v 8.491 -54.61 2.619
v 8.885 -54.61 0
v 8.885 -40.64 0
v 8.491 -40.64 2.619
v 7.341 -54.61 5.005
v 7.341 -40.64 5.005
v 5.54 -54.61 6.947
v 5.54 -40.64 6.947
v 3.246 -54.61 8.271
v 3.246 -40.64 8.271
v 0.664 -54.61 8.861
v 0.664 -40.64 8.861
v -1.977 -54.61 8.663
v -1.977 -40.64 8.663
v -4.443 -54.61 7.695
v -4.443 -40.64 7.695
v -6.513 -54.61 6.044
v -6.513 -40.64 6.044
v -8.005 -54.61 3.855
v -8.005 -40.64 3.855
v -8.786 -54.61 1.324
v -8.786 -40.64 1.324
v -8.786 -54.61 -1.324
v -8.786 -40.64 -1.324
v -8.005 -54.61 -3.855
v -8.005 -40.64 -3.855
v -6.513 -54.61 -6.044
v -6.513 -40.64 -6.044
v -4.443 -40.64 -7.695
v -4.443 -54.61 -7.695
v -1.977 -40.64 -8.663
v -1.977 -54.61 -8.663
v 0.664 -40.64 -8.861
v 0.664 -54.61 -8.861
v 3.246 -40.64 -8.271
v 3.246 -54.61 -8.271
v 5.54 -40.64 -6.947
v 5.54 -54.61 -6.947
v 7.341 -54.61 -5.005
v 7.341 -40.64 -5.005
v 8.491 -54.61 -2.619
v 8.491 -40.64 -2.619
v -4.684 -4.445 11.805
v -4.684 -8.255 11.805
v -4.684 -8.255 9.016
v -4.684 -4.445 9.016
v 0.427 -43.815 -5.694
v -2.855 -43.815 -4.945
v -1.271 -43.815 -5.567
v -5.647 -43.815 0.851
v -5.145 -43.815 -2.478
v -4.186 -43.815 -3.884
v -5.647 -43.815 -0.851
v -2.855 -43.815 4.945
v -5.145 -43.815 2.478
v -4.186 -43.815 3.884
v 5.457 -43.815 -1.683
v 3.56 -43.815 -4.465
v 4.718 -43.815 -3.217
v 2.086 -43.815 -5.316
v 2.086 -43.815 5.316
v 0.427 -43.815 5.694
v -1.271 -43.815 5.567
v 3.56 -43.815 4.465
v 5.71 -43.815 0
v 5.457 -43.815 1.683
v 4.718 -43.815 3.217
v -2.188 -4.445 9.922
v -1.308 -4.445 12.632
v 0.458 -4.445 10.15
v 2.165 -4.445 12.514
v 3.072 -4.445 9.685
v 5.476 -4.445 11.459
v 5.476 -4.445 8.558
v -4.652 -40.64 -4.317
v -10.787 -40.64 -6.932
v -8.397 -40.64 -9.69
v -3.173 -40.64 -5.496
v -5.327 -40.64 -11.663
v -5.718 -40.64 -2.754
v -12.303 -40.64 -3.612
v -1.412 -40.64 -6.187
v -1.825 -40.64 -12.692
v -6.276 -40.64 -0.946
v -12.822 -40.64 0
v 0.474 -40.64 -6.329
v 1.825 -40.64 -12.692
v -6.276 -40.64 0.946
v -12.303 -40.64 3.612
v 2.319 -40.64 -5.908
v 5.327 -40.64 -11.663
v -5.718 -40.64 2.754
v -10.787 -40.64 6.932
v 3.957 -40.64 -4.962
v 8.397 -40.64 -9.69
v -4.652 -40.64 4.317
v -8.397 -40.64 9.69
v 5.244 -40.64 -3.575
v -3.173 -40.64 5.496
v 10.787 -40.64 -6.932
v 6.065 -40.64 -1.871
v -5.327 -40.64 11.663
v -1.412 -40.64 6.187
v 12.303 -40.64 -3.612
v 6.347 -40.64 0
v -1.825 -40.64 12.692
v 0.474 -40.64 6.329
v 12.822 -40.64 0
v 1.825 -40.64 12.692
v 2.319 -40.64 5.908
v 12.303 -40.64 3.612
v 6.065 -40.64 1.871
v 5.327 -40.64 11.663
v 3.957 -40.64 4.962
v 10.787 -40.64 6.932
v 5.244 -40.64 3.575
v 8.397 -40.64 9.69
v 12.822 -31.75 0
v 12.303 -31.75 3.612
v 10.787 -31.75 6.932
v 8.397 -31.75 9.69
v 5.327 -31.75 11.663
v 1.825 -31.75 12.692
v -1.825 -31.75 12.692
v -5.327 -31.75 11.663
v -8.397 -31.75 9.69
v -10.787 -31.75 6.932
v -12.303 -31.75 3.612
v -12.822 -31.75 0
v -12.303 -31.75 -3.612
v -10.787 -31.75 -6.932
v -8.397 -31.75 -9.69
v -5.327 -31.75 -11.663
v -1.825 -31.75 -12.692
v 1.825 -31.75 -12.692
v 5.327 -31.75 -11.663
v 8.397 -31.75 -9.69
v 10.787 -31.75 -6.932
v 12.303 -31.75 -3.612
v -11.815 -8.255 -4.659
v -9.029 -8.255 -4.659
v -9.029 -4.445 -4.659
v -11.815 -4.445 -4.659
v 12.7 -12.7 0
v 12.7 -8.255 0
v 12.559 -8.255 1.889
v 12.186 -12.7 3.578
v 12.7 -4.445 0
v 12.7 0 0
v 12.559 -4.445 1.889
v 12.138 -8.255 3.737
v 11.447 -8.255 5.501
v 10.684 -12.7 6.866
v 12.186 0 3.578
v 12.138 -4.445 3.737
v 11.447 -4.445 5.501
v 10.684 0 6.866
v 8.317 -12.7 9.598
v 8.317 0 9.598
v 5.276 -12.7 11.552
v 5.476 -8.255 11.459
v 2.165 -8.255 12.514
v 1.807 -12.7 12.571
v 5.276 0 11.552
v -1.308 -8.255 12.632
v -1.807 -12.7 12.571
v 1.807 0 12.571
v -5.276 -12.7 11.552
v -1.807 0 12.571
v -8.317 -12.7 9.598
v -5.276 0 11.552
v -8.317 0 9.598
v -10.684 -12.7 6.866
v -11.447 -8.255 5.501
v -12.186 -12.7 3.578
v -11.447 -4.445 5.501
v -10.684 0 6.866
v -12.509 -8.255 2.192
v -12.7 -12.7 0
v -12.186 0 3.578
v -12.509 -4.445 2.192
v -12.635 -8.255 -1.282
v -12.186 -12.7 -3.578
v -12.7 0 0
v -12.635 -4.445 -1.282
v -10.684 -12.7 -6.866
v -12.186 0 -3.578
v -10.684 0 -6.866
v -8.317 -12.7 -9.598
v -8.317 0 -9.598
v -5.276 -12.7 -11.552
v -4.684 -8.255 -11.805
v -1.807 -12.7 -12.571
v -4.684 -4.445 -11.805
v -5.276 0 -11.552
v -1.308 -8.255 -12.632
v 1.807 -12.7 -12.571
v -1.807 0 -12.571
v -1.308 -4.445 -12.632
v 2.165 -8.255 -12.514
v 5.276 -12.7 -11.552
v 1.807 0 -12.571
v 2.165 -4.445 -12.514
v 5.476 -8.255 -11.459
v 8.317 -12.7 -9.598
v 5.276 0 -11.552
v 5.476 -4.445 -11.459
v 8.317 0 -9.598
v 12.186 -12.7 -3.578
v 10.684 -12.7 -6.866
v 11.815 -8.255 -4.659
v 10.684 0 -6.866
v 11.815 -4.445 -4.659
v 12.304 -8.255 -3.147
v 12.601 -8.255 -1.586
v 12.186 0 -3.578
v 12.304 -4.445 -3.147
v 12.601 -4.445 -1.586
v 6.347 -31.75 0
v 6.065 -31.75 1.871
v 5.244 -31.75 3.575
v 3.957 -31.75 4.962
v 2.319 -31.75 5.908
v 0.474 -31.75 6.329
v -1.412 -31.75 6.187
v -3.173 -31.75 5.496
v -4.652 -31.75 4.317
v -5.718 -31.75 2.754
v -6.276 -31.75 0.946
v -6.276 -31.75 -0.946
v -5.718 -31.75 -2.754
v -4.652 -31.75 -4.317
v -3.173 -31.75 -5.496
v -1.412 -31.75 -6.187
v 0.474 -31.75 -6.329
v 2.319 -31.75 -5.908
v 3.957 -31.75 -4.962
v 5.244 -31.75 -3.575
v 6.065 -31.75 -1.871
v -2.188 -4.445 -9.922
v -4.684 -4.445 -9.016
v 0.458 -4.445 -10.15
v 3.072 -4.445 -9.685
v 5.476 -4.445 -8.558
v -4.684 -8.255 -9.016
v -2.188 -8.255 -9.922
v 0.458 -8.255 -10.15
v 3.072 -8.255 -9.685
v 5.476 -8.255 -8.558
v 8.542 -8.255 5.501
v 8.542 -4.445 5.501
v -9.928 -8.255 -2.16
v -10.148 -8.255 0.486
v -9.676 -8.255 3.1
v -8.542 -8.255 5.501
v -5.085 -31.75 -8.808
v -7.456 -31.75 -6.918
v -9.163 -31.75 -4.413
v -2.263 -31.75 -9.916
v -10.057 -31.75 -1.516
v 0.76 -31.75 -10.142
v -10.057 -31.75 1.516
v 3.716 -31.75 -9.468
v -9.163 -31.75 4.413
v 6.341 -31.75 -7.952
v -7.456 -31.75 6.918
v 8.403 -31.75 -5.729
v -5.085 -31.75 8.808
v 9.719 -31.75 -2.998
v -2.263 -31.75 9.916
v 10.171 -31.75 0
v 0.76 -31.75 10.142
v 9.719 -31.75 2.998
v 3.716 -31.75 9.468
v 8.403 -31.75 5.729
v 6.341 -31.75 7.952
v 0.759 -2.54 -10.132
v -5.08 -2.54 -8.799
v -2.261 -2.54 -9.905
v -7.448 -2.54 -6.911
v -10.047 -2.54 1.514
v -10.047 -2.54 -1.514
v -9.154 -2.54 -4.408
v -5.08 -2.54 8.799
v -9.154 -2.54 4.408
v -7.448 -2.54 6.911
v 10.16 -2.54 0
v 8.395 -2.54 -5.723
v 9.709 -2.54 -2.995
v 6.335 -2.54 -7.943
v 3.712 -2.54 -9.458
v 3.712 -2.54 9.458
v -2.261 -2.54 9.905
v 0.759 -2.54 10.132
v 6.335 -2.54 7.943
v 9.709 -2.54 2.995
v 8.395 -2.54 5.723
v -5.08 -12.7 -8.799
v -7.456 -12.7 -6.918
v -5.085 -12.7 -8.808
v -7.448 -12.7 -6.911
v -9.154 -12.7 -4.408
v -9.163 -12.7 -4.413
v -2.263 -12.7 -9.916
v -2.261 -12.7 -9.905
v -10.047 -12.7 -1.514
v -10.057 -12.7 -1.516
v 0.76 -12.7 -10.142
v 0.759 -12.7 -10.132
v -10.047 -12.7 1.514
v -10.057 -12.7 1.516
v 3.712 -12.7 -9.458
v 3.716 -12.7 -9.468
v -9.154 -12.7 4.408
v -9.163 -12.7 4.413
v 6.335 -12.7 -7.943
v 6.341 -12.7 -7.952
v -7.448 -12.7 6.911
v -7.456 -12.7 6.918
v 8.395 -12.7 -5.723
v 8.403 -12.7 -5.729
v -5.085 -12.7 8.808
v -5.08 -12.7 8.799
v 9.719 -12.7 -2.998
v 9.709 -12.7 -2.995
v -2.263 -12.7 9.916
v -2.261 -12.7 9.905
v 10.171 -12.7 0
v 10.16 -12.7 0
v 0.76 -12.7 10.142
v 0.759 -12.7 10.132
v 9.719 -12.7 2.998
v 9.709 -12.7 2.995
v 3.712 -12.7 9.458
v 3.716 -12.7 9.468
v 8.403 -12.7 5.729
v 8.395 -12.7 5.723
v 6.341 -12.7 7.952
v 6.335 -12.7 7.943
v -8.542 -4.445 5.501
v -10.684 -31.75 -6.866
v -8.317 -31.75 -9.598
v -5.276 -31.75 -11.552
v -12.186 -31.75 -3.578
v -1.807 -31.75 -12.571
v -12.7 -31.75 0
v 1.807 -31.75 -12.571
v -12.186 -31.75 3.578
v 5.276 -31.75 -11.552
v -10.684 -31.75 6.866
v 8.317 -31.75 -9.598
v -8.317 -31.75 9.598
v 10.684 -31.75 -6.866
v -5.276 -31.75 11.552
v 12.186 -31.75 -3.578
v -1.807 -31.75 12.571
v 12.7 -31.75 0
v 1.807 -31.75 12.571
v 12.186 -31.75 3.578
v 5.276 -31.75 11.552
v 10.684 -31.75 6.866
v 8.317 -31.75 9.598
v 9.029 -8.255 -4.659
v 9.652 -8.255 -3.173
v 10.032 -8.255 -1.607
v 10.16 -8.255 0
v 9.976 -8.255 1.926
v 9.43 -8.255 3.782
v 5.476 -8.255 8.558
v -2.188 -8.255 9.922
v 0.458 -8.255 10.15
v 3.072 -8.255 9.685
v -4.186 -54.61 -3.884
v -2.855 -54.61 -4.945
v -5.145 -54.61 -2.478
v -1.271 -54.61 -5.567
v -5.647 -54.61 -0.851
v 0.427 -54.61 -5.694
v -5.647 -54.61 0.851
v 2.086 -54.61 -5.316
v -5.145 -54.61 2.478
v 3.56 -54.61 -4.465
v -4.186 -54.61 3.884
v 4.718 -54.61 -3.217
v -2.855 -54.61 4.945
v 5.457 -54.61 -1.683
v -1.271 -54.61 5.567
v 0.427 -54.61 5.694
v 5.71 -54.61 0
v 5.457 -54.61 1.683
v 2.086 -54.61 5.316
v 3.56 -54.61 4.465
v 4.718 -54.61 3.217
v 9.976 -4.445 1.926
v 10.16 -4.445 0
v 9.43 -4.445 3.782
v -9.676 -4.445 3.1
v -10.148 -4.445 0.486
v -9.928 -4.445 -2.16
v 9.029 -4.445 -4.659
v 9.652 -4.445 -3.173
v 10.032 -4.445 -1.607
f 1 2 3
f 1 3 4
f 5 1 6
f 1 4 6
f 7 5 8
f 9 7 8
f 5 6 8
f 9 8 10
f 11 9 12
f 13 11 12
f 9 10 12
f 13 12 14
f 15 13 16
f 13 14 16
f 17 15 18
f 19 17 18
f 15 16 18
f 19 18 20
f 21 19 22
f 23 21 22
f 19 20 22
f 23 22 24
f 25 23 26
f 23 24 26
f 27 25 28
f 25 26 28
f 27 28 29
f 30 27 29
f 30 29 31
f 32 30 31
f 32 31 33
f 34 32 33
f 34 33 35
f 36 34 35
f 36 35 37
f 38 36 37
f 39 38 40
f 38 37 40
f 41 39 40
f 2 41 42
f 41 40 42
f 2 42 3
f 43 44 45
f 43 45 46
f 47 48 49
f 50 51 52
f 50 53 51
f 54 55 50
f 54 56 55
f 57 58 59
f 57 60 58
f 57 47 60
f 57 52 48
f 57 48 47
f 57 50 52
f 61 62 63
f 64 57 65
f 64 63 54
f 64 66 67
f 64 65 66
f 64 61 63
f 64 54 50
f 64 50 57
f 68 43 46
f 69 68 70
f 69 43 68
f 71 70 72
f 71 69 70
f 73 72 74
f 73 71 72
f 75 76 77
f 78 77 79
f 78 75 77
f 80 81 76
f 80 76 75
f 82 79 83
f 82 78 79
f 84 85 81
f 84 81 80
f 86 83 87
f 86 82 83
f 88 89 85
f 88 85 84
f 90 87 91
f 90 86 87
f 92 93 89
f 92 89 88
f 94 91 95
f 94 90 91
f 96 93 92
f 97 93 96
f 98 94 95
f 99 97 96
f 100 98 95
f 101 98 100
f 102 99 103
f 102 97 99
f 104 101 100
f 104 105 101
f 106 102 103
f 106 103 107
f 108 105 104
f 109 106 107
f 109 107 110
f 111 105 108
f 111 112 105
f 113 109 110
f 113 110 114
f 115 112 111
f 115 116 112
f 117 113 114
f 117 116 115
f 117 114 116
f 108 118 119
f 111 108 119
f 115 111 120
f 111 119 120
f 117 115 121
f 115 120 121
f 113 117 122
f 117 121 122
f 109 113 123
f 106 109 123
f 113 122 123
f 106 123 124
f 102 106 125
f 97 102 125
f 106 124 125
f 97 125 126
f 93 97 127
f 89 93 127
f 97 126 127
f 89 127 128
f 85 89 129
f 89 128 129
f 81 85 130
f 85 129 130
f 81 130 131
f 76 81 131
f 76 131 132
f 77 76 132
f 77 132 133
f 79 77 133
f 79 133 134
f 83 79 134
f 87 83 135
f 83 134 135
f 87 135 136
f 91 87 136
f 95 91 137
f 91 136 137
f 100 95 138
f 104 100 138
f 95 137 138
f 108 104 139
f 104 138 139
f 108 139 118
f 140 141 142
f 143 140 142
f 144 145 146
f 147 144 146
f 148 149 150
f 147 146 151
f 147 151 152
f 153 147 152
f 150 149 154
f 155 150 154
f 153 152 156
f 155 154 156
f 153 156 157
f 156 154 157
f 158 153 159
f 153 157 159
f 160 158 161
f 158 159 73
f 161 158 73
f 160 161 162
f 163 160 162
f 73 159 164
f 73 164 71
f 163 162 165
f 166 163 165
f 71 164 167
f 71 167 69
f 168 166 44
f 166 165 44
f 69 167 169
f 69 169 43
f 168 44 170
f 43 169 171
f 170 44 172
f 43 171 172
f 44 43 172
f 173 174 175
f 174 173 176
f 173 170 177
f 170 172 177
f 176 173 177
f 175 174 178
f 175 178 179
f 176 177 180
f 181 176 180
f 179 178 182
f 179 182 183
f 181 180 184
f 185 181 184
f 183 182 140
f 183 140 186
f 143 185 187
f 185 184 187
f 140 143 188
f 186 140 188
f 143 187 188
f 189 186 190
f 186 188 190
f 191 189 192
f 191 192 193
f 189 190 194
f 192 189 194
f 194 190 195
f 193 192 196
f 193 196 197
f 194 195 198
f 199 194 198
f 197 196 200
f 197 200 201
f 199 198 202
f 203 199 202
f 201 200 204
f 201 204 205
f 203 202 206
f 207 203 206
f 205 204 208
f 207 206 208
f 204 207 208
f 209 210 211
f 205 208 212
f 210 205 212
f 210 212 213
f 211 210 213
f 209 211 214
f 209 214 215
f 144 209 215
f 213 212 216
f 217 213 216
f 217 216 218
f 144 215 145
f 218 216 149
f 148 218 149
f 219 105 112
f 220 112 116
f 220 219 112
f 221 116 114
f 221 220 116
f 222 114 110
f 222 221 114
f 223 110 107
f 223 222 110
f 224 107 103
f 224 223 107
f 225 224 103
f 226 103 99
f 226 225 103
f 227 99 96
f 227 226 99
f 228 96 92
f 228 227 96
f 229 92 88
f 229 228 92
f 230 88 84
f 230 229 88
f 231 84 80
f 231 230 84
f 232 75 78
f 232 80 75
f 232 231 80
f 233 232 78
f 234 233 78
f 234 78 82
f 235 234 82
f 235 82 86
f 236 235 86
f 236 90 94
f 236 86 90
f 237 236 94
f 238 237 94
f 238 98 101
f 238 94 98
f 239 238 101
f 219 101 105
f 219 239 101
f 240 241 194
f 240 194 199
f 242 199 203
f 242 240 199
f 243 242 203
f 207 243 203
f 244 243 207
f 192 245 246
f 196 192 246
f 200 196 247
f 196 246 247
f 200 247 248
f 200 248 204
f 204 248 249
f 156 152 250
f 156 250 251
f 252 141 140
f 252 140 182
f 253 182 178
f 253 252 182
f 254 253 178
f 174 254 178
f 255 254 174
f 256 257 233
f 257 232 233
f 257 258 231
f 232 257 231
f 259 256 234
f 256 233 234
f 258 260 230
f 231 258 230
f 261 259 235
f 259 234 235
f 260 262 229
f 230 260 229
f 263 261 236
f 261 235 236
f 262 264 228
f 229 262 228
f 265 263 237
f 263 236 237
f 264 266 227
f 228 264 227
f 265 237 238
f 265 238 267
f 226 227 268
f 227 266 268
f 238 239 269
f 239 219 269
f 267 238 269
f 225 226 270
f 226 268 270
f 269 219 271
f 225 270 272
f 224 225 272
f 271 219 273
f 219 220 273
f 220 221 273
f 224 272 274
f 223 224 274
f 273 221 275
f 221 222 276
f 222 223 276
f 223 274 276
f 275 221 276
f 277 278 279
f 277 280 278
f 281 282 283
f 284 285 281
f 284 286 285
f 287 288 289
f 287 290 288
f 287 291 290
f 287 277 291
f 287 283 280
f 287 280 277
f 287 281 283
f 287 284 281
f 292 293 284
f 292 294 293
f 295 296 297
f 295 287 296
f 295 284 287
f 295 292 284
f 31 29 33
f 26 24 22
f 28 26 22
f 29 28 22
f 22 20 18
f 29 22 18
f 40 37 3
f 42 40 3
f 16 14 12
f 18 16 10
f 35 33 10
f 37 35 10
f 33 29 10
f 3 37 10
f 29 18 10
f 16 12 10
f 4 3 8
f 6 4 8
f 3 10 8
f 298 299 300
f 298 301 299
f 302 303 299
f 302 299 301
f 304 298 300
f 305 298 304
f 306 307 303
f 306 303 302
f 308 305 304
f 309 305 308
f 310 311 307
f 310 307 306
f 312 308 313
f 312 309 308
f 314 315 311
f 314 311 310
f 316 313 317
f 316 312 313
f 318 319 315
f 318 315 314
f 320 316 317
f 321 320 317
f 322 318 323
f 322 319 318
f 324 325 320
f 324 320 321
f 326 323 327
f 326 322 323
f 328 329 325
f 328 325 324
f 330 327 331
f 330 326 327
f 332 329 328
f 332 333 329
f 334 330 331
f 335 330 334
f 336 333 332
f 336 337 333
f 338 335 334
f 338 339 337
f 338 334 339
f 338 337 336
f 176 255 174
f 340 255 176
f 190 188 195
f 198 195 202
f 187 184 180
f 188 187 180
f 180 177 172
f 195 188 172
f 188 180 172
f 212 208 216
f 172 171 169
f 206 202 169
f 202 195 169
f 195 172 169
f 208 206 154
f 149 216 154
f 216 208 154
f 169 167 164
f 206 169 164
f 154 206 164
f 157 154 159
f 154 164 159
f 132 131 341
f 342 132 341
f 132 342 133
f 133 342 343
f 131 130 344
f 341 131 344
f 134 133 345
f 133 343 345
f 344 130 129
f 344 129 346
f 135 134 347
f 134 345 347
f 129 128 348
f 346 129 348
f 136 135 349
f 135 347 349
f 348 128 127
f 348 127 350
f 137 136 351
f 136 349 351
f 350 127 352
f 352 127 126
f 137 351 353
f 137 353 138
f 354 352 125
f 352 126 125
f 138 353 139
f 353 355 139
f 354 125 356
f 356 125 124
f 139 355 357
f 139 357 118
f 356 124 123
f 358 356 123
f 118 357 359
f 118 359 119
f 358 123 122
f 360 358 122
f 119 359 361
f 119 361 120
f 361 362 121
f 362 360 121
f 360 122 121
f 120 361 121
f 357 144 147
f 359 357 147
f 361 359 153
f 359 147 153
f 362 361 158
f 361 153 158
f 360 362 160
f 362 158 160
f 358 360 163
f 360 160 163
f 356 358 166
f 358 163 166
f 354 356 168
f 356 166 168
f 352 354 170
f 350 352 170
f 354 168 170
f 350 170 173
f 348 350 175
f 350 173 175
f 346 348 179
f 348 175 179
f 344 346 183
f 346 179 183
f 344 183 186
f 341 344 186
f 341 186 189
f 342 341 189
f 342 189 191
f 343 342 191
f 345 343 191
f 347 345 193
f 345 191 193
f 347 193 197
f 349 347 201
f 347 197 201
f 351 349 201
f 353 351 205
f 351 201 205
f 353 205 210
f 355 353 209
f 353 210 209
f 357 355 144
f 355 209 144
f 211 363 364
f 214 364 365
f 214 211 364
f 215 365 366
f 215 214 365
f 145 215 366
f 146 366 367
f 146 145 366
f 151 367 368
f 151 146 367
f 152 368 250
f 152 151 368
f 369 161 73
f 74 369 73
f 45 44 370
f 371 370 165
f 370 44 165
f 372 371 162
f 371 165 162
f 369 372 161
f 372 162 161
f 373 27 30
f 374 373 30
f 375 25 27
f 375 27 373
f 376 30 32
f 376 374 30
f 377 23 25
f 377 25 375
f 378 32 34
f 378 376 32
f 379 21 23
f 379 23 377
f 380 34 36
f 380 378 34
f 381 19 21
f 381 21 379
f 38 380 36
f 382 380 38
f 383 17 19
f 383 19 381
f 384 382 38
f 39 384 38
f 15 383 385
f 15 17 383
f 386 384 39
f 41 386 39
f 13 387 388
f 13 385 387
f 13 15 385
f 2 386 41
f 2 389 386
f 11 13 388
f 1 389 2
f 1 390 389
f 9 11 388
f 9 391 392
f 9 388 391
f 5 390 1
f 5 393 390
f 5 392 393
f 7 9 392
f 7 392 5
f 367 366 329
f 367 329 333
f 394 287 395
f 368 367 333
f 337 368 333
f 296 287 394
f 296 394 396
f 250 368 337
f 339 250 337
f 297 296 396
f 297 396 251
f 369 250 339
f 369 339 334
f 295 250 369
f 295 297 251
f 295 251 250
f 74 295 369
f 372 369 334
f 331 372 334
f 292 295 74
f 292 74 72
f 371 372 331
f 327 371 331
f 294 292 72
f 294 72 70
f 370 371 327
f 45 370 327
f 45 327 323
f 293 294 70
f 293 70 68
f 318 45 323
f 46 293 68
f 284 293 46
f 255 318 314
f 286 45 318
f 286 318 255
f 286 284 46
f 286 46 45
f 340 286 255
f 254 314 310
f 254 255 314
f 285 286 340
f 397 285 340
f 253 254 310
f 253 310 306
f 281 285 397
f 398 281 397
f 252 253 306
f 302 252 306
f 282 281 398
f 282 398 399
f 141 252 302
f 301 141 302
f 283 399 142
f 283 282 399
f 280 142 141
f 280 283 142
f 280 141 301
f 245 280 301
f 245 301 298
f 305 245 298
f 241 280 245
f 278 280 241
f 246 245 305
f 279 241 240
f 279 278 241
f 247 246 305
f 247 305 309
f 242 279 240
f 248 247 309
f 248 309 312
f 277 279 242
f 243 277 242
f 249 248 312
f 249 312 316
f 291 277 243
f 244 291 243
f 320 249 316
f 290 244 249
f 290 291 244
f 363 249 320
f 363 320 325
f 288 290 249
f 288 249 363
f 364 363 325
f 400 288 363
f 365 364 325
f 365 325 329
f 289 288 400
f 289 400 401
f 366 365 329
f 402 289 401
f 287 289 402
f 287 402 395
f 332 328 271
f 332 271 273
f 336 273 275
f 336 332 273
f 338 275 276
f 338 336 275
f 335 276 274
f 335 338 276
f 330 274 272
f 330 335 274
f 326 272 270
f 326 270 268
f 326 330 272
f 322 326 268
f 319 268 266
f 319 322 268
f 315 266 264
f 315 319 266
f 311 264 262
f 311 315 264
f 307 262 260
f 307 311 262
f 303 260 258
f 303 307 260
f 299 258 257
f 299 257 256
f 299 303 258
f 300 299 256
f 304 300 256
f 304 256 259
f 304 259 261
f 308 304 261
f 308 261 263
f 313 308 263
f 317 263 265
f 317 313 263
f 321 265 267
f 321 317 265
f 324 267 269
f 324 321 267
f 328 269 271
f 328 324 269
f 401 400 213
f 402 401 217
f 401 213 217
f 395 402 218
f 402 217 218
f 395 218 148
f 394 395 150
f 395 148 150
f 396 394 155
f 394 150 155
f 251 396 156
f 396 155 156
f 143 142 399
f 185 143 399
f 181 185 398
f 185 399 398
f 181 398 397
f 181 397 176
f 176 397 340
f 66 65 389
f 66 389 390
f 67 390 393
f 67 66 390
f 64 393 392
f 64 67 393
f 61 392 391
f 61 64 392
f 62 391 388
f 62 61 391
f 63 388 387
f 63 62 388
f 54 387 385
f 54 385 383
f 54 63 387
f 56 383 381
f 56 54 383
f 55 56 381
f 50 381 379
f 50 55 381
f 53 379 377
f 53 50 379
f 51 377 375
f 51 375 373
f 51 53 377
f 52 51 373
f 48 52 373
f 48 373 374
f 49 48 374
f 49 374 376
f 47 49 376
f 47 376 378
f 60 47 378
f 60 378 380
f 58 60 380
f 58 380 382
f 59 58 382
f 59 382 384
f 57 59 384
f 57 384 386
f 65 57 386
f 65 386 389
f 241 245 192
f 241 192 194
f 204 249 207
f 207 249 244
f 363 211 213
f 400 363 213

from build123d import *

# Parameters (mm, degrees)
F0_R      = 12.7
F1_DEPTH  = 12.7
F4_T      = -2.54
F2_W      = 3.81
F2_H      = 10.16
F5_DEPTH  = 12.7
F3_W      = 10.16
F3_H      = 3.81
F6_DEPTH  = 12.7
F8_R      = 12.699984
F8_R_2    = 10.170676
F9_DEPTH  = 19.05
F11_R     = 12.822139
F12_DEPTH = 8.89
F13_R     = 6.34653
F14_DEPTH = 10.414
F16_R     = 8.885422
F17_DEPTH = 13.97
F18_T     = -3.175


with BuildPart() as f1:
    # F0 (on Front) → F1 (new body)
    with BuildSketch(Plane.XZ):
        Circle(F0_R)
    extrude(amount=F1_DEPTH)

    # F4
    f4_openings = [f1.faces().sort_by_distance(p)[0] for p in [
        (0, -12.7, 0),
    ]]
    offset(amount=F4_T, openings=f4_openings)

    # F2 (on Right) → F5 (cut, symmetric)
    with BuildSketch(Plane.YZ):
        with Locations((-6.35, 0.421089)):
            Rectangle(F2_W, F2_H)
    extrude(amount=F5_DEPTH, both=True, mode=Mode.SUBTRACT)

    # F3 (on Top) → F6 (cut, symmetric)
    with BuildSketch(Plane.XY):
        with Locations((0.396187, -6.35)):
            Rectangle(F3_W, F3_H)
    extrude(amount=F6_DEPTH, both=True, mode=Mode.SUBTRACT)

    # F8 (on offset) → F9 (join)
    with BuildSketch(Plane.XZ.offset(12.7)):
        Circle(F8_R)
        Circle(F8_R_2, mode=Mode.SUBTRACT)
    extrude(amount=F9_DEPTH)

    # F11 (on offset) → F12 (join)
    with BuildSketch(Plane.XZ.offset(31.75)):
        Circle(F11_R)
    extrude(amount=F12_DEPTH)

    # F13 (on offset) → F14 (cut)
    with BuildSketch(Plane.XZ.offset(31.75)):
        Circle(F13_R)
    extrude(amount=F14_DEPTH, mode=Mode.SUBTRACT)


with BuildPart() as f17:
    # F16 (on offset) → F17 (new body)
    with BuildSketch(Plane.XZ.offset(40.64)):
        Circle(F16_R)
    extrude(amount=F17_DEPTH)

    # F18
    f18_openings = [f17.faces().sort_by_distance(p)[0] for p in [
        (0, -54.61, 0),
    ]]
    offset(amount=F18_T, openings=f18_openings)


solid = Compound([f1.part, f17.part])
